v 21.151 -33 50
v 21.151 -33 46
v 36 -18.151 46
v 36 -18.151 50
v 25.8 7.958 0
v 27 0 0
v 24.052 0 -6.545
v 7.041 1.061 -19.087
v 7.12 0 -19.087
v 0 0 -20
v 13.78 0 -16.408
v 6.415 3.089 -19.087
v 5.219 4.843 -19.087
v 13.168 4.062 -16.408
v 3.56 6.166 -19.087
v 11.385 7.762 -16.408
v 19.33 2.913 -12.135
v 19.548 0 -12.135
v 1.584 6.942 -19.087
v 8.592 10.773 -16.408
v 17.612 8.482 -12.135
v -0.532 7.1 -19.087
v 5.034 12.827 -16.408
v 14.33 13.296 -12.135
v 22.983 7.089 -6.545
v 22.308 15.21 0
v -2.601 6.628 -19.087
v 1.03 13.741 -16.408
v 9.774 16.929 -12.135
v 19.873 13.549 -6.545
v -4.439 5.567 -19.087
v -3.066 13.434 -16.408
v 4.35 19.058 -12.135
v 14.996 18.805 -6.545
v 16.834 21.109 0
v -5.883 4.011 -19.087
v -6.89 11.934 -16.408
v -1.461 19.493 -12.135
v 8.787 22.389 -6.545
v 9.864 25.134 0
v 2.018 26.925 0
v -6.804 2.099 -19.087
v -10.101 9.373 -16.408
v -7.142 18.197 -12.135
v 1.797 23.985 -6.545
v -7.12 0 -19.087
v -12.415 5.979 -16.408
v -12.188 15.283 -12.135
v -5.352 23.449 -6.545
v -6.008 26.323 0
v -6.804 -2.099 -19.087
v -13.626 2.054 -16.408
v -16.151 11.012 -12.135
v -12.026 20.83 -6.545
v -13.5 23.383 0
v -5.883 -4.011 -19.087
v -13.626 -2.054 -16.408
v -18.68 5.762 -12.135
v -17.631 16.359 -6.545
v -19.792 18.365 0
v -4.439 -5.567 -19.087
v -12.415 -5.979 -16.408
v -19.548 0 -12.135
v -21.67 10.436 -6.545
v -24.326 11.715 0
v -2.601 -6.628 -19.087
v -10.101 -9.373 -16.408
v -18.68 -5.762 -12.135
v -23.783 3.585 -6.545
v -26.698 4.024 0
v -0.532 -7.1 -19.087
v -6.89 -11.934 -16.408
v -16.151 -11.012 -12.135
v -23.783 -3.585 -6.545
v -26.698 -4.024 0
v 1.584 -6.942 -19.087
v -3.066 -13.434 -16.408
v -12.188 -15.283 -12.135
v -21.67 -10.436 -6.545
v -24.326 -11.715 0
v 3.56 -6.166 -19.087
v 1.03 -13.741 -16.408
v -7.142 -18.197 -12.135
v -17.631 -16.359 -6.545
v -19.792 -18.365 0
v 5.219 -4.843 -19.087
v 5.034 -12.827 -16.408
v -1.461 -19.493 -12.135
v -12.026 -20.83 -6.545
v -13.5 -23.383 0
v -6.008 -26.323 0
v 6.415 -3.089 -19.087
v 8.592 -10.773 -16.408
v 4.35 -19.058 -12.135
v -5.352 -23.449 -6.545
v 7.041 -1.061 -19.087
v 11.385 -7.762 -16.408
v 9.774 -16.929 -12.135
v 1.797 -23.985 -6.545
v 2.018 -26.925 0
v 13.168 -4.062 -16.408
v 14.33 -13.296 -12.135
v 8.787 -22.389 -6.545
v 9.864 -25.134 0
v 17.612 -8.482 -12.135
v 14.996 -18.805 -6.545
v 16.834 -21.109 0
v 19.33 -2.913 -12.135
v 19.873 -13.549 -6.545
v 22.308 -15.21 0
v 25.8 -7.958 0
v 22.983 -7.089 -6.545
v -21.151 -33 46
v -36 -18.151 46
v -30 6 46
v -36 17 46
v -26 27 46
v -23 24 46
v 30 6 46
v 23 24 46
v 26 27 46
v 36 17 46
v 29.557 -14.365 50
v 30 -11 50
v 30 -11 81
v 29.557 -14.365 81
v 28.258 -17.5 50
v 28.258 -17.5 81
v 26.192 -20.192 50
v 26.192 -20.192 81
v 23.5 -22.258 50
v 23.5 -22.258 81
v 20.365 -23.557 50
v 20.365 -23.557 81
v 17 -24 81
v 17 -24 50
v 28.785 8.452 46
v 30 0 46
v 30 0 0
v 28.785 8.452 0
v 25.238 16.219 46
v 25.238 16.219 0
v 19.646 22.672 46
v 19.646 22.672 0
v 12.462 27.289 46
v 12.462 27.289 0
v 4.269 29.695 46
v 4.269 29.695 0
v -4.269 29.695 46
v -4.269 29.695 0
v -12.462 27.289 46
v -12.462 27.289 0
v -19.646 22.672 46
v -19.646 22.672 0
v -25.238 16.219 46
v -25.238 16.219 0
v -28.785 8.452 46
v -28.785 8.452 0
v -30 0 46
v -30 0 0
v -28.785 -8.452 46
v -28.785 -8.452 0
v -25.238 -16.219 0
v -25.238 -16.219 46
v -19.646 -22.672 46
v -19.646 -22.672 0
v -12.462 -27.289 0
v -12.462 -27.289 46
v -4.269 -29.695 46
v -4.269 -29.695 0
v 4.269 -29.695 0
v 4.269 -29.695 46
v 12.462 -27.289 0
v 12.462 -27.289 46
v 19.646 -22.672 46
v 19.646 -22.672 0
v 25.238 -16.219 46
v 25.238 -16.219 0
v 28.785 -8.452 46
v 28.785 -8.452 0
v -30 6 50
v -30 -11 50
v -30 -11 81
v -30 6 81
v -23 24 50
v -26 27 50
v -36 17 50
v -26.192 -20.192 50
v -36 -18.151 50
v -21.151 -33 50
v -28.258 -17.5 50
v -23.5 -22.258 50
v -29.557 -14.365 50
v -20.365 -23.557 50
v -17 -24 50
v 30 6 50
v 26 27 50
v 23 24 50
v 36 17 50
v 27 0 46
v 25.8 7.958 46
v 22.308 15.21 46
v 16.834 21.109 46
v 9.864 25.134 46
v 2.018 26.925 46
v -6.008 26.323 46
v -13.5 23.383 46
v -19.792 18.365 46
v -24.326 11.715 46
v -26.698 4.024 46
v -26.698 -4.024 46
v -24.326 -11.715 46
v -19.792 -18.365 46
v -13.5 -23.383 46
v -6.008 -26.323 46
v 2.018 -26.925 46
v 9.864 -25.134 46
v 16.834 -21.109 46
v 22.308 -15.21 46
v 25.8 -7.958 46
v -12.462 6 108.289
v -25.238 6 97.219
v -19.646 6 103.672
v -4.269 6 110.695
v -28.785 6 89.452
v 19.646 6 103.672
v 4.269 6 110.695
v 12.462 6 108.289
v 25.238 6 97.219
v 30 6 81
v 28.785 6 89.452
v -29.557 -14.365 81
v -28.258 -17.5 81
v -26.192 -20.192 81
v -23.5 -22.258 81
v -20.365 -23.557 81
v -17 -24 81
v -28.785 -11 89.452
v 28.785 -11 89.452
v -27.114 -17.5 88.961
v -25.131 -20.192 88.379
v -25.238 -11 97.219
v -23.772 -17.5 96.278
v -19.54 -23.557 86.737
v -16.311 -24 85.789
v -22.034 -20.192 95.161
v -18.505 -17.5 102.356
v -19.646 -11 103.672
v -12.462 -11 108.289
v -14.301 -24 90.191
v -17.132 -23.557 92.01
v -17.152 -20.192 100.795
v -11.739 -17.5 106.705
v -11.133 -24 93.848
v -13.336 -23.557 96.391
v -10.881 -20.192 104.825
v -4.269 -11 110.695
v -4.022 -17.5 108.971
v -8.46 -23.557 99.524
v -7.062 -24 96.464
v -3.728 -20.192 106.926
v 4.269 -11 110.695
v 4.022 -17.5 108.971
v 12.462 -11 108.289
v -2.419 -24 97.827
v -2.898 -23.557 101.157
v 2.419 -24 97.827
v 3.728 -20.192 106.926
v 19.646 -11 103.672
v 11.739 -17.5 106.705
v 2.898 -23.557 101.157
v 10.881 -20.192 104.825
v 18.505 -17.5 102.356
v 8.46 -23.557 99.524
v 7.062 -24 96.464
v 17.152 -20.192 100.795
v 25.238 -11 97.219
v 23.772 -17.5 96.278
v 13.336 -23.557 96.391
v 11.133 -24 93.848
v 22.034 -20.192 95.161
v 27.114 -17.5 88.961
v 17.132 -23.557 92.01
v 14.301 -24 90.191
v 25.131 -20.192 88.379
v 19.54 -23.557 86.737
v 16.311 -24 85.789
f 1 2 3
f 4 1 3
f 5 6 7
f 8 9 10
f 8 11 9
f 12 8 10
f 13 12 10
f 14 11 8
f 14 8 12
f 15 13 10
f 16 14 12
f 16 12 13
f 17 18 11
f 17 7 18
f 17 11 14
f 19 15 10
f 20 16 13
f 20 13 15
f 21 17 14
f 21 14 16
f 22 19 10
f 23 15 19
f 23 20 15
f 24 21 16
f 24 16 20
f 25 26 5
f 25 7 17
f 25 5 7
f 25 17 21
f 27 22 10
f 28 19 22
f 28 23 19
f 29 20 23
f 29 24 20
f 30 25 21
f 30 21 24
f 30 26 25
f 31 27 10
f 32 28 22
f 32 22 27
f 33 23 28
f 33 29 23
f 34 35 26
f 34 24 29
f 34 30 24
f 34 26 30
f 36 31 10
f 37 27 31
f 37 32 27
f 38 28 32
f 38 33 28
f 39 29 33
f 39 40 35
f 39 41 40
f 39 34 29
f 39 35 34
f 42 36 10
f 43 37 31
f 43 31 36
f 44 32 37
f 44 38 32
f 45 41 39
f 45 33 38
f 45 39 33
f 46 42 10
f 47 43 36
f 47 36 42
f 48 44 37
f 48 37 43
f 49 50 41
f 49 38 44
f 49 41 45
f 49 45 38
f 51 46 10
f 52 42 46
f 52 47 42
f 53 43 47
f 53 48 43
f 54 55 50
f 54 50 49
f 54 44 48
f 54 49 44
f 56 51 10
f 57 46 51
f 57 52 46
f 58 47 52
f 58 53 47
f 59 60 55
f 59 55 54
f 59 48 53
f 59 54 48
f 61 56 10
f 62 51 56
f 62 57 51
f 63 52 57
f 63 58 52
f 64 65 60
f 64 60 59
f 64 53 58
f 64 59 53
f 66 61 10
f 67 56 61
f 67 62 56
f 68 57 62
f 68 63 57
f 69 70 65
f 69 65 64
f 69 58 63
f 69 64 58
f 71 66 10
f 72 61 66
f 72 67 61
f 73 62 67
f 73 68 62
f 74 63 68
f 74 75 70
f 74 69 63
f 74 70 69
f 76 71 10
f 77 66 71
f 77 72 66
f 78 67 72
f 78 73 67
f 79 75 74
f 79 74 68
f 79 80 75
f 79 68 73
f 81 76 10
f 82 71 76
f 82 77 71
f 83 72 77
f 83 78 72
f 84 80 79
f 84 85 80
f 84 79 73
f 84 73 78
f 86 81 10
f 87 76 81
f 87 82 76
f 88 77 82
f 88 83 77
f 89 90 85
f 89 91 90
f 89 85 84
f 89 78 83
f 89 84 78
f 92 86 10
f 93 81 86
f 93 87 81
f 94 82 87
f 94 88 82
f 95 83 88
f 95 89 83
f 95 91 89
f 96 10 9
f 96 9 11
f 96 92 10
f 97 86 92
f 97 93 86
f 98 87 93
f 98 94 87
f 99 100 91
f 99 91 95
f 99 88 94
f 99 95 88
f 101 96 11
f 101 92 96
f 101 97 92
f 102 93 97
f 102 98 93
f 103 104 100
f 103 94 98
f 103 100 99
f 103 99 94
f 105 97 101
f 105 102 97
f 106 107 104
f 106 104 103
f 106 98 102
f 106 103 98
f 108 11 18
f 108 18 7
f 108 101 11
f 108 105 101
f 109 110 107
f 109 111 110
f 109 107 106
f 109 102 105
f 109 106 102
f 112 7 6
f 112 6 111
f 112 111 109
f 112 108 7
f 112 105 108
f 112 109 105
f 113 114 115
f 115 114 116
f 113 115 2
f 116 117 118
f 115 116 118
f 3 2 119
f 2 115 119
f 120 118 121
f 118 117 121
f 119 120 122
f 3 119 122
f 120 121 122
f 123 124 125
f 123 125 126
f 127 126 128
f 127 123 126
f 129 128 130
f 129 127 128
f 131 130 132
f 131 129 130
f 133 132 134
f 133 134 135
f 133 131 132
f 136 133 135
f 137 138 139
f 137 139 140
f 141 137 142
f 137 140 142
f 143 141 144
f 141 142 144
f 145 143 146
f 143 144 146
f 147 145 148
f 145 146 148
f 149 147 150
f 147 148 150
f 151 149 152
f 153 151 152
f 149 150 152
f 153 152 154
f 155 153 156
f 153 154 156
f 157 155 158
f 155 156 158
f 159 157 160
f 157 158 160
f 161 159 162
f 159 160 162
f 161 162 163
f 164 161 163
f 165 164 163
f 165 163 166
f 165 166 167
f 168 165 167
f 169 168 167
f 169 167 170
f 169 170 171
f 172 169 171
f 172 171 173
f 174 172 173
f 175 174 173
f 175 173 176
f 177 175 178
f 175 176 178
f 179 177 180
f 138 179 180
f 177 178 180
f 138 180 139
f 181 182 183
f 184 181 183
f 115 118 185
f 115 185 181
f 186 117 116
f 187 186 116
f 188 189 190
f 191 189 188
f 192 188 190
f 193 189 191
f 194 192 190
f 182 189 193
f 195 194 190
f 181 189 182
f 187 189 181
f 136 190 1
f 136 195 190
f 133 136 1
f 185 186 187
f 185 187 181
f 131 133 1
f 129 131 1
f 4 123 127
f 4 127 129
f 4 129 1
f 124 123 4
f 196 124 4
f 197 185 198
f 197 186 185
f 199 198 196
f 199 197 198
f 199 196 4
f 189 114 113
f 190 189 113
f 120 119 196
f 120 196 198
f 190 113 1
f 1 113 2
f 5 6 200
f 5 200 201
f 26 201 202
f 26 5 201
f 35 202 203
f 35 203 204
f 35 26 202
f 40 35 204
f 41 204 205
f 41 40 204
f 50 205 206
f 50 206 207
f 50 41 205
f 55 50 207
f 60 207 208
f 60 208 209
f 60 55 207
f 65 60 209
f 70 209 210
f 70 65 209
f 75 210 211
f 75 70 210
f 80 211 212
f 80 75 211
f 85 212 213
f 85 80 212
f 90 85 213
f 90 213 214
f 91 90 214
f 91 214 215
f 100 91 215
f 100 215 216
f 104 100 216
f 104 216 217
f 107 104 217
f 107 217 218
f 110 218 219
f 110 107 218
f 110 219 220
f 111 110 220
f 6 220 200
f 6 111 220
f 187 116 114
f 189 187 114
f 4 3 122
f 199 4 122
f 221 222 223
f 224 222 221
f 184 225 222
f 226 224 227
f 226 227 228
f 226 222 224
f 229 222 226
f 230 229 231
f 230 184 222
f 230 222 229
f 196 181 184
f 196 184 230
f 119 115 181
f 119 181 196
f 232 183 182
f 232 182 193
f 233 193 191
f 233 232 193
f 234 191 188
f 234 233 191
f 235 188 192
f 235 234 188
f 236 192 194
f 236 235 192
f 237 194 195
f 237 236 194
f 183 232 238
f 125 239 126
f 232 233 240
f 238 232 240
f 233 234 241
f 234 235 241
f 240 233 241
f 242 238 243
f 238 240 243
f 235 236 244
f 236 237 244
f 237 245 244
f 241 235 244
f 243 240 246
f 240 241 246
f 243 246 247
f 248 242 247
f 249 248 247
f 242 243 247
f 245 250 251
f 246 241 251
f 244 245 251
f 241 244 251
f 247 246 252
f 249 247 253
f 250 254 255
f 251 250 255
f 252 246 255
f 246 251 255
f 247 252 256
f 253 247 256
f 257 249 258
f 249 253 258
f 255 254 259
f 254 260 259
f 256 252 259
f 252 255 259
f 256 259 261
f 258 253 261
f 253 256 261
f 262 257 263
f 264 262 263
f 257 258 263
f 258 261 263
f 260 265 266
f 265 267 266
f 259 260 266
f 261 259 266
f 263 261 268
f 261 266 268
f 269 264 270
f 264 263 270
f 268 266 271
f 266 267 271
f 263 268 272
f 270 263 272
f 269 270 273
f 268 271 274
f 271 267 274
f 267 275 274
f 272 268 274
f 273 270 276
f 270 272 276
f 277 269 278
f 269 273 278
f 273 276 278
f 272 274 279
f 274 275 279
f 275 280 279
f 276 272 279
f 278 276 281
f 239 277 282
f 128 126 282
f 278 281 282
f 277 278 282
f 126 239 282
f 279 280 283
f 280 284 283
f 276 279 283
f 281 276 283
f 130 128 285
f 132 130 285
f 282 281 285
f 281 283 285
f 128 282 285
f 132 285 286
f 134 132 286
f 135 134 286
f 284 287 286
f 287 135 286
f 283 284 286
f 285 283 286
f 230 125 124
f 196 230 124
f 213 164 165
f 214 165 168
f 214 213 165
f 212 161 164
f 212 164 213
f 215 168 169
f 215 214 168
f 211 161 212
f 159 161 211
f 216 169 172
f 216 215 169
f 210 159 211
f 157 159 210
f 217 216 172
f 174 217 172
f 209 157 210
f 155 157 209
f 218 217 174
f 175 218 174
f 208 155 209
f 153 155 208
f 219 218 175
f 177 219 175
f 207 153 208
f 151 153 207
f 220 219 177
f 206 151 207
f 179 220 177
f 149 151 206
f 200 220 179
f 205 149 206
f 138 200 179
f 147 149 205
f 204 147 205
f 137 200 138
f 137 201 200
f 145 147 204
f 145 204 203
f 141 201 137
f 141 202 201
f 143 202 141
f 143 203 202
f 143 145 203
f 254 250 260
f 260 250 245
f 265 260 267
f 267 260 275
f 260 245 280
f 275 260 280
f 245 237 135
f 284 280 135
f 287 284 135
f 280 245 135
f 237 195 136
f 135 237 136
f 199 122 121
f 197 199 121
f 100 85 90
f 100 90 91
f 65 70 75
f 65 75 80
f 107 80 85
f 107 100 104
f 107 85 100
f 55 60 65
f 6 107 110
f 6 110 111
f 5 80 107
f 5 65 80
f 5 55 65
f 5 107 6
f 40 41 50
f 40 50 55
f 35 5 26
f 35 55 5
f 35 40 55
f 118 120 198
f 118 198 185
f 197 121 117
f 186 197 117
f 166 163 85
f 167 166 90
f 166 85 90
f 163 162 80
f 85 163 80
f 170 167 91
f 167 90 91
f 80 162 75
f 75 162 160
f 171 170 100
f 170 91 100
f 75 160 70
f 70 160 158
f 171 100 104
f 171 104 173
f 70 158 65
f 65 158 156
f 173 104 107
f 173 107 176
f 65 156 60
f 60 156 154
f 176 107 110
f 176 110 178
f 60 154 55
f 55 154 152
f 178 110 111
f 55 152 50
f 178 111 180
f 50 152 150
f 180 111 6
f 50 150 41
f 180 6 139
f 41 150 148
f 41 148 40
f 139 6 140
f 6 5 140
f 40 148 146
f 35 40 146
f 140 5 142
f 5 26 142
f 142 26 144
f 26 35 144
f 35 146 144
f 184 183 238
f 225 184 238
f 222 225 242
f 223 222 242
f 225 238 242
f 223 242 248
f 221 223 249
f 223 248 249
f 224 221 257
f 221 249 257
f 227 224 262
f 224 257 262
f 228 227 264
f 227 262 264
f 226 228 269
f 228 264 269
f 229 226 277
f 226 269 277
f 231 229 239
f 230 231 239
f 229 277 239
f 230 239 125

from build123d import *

# Parameters (mm, degrees)
SKETCH1_R                = 30
SKETCH1_R_2              = 27
BOSS_EXTRUDE1_DEPTH      = 46
BOSS_EXTRUDE2_DEPTH      = 6
BOSS_EXTRUDE2_DEPTH_BACK = 24
FILLET1_R                = 13
BOSS_EXTRUDE7_DEPTH      = 4


with BuildPart() as part:
    # Sketch1 → Boss-Extrude1 (new body)
    with BuildSketch(Plane.XY):
        Circle(SKETCH1_R)
        Circle(SKETCH1_R_2, mode=Mode.SUBTRACT)
    extrude(amount=BOSS_EXTRUDE1_DEPTH)


with BuildPart() as body_2:
    # Sketch3 → Revolve1 (revolve)
    with BuildSketch(Plane(origin=(0, 0, 0), x_dir=(1, 0, 0), z_dir=(0, 1, 0))):
        with BuildLine():
            Line((27, 0), (0, 0))
            Line((0, 0), (0, 20))
            ThreePointArc((0, 20), (16.800297616, 14.455401782), (27, 0))
        make_face()
    revolve(axis=Axis((0, 0, -24.323945347), (0, 0, 1)))


with BuildPart() as body_3:
    # Sketch5 → Boss-Extrude2 (new, two sides: drawn at the far end of the back side and taken through both)
    with BuildSketch(Plane(origin=(0, 0, 0), x_dir=(1, 0, 0), z_dir=(0, 1, 0)).offset(-BOSS_EXTRUDE2_DEPTH_BACK)):
        with BuildLine():
            Line((-30, -46), (-30, -81))
            ThreePointArc((-30, -81), (0, -111), (30, -81))
            Line((30, -81), (30, -46))
            Line((30, -46), (-30, -46))
        make_face()
    extrude(amount=BOSS_EXTRUDE2_DEPTH + BOSS_EXTRUDE2_DEPTH_BACK)

    # Fillet1
    fillet1_edges = [body_3.edges().sort_by_distance(p)[0] for p in [
        (0, -24, 111),
        (30, -24, 63.5),
        (-30, -24, 63.5),
    ]]
    fillet(fillet1_edges, radius=FILLET1_R)

    # Sketch7 → Boss-Extrude7 (add)
    with BuildSketch(Plane.XY.offset(46)):
        Polygon((-36, 17), (-36, -18.150757595), (-21.150757595, -33), (21.150757595, -33), (36, -18.150757595), (36, 17), (26, 27), (-26, 27), align=None)
        Polygon((-30, 6), (30, 6), (23, 24), (-23, 24), align=None, mode=Mode.SUBTRACT)
    extrude(amount=BOSS_EXTRUDE7_DEPTH)


solid = Compound([part.part, body_2.part, body_3.part])
